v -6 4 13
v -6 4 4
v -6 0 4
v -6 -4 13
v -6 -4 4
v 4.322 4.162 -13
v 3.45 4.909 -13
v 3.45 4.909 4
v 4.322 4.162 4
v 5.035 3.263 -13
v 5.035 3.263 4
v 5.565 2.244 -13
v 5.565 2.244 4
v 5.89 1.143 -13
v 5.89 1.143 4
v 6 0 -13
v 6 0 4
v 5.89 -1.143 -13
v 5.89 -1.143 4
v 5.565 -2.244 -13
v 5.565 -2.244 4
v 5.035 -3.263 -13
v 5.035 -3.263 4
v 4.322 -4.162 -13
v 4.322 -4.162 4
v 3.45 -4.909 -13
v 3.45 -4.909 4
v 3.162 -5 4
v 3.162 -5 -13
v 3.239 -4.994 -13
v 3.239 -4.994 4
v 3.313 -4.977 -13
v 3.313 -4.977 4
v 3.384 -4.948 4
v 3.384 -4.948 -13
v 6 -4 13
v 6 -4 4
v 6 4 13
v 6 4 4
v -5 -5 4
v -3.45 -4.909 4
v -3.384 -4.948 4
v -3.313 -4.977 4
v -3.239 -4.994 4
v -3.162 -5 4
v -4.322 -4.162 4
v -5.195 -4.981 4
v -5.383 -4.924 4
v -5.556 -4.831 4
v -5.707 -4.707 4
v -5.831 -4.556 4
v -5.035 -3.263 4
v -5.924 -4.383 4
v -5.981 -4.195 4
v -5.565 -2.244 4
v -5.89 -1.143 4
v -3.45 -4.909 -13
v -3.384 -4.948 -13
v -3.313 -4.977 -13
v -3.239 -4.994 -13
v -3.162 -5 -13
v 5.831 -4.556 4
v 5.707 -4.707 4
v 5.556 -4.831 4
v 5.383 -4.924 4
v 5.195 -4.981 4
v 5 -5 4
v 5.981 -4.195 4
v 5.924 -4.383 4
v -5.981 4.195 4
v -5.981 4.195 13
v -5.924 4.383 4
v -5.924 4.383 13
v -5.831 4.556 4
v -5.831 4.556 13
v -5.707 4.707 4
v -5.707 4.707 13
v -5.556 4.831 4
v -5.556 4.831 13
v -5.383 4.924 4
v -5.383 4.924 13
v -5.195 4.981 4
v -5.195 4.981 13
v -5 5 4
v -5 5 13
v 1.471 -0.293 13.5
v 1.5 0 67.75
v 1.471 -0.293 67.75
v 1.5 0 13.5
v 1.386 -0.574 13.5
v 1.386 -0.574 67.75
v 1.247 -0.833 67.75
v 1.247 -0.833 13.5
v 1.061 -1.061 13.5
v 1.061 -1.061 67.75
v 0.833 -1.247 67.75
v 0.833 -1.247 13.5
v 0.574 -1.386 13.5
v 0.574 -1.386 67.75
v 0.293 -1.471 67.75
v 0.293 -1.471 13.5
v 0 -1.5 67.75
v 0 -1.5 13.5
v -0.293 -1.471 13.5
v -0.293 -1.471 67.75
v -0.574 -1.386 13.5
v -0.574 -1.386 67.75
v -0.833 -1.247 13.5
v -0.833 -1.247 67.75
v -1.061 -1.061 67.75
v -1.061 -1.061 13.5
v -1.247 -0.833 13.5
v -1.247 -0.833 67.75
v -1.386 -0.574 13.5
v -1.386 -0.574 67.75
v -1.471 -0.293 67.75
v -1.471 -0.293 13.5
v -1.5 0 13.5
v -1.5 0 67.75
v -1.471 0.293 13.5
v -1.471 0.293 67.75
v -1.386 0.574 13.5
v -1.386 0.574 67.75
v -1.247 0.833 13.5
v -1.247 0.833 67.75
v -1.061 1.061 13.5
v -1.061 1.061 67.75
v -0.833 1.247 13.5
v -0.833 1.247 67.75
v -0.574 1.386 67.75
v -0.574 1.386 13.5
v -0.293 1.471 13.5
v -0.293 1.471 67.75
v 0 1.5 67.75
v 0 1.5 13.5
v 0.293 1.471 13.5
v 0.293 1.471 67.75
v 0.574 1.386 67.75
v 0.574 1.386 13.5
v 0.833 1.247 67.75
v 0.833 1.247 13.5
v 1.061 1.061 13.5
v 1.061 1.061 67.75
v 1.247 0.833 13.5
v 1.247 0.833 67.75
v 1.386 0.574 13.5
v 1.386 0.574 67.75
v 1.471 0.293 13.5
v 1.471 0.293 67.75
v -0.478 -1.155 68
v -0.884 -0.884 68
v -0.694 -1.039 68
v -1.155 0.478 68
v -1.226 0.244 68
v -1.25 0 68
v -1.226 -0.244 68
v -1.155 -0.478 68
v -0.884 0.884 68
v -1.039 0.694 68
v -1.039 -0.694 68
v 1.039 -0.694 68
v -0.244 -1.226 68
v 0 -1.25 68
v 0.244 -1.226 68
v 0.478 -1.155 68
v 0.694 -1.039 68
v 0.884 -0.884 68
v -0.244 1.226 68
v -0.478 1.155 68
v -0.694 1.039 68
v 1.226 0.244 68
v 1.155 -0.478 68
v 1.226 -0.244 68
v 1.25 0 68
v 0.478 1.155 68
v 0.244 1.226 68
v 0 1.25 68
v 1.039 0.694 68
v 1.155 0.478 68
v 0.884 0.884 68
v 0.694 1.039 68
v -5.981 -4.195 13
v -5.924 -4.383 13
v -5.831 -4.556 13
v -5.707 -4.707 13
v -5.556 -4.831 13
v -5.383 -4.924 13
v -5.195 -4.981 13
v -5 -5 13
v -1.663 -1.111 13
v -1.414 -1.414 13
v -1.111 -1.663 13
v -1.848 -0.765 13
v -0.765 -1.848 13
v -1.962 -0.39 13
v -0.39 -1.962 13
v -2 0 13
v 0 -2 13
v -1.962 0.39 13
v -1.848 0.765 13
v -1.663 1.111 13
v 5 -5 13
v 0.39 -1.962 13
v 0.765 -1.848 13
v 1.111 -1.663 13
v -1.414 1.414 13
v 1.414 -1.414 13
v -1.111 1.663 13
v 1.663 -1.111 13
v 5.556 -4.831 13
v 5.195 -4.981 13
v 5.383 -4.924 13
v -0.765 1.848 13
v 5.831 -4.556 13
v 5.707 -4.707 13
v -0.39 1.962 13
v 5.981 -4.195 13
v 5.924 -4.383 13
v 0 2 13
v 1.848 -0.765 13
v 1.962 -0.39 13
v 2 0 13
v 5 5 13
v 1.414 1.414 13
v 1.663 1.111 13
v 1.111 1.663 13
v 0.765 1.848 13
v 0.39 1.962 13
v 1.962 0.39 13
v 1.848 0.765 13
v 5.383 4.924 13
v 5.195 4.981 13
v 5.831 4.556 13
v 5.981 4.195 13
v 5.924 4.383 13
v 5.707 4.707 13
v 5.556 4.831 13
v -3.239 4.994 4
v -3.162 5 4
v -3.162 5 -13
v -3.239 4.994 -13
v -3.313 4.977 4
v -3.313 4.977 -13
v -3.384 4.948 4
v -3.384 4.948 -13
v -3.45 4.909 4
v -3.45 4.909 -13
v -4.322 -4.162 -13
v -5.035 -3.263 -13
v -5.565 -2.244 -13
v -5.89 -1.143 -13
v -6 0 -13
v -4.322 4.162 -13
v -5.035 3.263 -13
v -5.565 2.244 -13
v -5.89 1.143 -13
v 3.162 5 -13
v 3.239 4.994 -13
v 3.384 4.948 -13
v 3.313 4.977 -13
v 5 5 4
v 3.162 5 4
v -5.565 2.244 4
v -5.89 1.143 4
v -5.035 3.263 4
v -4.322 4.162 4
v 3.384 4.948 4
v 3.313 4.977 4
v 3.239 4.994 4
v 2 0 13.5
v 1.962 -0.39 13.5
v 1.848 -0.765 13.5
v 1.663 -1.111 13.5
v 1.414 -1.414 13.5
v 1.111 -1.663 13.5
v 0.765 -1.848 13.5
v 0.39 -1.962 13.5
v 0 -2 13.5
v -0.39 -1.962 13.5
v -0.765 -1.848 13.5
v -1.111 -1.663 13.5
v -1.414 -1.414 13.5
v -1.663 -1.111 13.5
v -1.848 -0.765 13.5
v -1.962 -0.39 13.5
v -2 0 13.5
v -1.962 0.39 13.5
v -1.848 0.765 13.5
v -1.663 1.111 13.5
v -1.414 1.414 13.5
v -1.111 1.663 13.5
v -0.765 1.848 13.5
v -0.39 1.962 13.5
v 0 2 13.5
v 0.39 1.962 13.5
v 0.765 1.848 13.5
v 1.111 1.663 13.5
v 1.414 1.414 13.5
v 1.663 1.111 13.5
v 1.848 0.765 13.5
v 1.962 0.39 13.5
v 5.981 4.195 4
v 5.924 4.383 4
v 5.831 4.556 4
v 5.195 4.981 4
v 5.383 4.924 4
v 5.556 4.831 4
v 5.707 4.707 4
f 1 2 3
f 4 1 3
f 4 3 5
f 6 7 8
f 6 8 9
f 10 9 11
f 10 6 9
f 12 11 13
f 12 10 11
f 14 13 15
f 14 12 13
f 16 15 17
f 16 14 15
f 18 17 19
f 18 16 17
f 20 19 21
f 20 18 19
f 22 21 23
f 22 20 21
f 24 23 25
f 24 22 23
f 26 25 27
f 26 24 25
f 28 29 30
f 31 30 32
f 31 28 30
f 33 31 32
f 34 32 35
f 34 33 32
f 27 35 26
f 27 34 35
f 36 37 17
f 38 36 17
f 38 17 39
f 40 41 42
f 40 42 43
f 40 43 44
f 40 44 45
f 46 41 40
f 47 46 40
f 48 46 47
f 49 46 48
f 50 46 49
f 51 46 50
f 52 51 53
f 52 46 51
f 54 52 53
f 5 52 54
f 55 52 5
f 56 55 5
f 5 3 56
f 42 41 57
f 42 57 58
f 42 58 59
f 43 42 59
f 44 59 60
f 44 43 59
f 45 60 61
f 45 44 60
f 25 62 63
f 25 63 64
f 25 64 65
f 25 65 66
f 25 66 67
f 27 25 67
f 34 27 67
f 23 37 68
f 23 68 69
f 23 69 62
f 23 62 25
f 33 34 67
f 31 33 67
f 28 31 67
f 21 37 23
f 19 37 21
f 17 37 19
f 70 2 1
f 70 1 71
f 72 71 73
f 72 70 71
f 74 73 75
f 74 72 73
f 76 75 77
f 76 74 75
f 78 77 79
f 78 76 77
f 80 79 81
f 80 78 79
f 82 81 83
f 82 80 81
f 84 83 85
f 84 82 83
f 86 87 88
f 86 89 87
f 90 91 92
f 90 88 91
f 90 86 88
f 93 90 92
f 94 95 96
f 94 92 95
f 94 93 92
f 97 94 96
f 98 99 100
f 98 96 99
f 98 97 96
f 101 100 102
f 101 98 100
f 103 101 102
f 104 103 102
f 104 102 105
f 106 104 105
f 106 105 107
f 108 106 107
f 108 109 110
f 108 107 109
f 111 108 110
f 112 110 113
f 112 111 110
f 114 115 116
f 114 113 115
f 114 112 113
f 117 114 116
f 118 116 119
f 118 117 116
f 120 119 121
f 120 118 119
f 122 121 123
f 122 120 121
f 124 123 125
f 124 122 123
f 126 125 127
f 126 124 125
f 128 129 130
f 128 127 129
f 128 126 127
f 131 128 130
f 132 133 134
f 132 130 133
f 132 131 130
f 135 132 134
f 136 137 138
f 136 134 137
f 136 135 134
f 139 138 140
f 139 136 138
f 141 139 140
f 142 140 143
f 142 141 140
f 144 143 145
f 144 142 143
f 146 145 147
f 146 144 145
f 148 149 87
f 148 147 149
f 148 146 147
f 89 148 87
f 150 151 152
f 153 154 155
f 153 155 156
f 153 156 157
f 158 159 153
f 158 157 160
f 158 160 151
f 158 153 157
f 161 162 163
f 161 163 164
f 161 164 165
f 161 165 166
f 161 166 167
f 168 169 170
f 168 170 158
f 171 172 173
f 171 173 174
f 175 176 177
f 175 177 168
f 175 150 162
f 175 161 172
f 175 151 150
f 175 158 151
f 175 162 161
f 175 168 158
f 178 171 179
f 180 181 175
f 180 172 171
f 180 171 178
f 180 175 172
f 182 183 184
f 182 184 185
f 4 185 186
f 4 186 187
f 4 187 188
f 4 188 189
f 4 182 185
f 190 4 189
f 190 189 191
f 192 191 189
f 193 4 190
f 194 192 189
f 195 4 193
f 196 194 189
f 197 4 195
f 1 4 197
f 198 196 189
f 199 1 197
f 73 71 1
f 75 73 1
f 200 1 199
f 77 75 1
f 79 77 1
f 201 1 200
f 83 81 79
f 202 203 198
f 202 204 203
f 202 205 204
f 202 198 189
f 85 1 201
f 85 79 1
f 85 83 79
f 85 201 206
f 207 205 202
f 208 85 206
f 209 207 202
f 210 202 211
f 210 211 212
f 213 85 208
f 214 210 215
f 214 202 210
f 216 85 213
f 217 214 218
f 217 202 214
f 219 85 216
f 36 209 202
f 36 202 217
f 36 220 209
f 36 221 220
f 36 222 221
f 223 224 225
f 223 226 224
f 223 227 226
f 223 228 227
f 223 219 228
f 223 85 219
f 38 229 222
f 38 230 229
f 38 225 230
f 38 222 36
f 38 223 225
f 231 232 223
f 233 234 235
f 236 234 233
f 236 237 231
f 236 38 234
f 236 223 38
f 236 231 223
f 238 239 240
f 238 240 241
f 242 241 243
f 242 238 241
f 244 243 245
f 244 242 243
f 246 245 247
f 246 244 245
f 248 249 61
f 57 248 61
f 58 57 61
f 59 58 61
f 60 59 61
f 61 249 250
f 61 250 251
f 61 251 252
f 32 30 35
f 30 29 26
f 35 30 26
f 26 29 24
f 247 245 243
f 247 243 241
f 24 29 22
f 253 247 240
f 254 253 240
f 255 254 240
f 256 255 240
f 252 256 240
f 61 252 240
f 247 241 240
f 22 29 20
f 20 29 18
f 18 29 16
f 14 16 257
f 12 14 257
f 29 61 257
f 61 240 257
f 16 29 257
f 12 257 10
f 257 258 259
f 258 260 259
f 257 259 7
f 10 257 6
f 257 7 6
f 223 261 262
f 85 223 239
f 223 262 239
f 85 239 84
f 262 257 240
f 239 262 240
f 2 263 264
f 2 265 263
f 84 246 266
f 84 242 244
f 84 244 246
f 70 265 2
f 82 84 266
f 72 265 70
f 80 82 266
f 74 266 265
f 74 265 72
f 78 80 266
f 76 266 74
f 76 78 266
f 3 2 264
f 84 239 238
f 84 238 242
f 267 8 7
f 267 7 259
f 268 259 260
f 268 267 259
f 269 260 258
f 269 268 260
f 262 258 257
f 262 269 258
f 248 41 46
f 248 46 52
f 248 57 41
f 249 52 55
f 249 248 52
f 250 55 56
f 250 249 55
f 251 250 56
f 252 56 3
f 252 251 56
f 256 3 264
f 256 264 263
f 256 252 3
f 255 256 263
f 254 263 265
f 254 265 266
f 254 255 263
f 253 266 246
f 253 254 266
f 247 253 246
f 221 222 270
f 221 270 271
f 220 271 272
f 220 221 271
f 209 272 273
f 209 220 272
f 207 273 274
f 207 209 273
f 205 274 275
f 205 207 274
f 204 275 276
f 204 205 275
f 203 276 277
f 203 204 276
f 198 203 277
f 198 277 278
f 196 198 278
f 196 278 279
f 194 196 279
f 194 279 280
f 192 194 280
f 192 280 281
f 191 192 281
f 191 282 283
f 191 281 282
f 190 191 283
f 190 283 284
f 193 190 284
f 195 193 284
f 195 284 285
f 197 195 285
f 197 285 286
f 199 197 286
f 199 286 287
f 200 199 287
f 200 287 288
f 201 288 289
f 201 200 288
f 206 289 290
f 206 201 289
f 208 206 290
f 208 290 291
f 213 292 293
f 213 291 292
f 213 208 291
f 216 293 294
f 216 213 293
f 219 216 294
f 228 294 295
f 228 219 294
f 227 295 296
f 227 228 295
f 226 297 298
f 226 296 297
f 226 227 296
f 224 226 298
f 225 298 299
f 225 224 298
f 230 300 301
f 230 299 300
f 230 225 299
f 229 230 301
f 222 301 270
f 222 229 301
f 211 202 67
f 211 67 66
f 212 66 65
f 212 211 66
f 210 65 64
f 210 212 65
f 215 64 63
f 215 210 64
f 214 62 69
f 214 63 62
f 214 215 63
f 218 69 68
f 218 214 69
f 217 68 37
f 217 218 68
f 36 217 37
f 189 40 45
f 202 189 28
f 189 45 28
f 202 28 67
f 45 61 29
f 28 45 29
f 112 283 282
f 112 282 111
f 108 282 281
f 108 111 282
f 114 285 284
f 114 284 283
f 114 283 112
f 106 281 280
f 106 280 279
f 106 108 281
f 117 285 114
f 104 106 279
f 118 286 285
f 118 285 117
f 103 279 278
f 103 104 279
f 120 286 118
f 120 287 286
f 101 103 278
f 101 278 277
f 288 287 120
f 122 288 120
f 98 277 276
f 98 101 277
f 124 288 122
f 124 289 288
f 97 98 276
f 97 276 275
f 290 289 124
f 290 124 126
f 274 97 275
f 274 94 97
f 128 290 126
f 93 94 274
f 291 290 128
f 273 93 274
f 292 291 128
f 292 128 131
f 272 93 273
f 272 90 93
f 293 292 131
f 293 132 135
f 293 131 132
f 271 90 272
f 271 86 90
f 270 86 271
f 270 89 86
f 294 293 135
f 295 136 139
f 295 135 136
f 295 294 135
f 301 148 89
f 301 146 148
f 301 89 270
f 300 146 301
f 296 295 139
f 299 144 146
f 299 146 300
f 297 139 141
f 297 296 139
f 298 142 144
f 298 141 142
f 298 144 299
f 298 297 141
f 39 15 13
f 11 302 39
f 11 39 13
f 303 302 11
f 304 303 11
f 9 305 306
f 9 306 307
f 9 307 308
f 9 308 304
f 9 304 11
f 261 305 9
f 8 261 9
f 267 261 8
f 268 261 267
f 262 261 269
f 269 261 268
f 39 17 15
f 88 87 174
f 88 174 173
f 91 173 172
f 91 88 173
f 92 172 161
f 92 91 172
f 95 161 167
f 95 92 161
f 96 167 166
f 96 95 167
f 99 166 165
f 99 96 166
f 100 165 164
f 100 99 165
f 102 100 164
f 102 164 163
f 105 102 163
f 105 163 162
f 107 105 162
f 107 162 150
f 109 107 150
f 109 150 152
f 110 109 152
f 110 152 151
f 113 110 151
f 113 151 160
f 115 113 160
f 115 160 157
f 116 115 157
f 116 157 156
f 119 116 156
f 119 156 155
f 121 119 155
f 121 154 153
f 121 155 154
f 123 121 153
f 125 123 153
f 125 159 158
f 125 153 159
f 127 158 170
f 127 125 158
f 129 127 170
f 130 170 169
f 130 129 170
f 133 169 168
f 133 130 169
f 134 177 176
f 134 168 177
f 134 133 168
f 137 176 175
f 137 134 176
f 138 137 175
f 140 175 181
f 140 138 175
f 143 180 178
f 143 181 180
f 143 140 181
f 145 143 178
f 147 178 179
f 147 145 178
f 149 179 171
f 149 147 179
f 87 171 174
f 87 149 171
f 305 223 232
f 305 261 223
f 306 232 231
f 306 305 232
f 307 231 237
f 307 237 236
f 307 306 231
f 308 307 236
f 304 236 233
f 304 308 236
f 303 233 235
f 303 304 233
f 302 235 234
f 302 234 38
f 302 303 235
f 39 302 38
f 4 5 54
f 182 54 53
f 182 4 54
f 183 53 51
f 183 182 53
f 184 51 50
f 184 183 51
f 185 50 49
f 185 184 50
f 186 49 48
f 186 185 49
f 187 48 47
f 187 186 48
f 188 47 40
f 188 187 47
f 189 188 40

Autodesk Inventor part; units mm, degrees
ref_plane "YZ Plane" through (0, 0, 0) normal (1, 0, 0) x (0, 1, 0)
ref_plane "XZ Plane" through (0, 0, 0) normal (0, 1, 0) x (-1, 0, 0)
ref_plane "XY Plane" through (0, 0, 0) normal (0, 0, 1) x (1, 0, 0)
sketch "Sketch1" plane through (0, 0, 0) normal (0, 0, 1) x (1, 0, 0)
  line L0 (-6, -5) -> (6, -5)
  line L1 (6, -5) -> (6, 5)
  line L2 (6, 5) -> (-6, 5)
  line L3 (-6, 5) -> (-6, -5)
  line L4 (-6, -5) -> (6, 5) construction
  line L5 (6, -5) -> (-6, 5) construction
  point P0 (0, 0)
  dimension "d0" = 12
  dimension "d1" = 10
extrude "Extrusion1" add sketch "Sketch1" along normal mid plane 26
sketch "Sketch2" plane through (0, 0, 13) normal (0, 0, 1) x (1, 0, 0)
  circle A0 centre (0, 0) radius 1.5
  circle A1 centre (0, 0) radius 2
  dimension "d4" = 3
  dimension "d12" = 4
extrude "Extrusion2" add sketch "Sketch2" along normal blind 55 contours A0
fillet "Fillet1" radius 1 4 edges at (6, 5, 0) (-6, 5, 0) (6, -5, 0) (-6, -5, 0)
sketch "Sketch3" plane through (0, 0, -13) normal (0, 0, -1) x (-1, 0, 0)
  arc A0 (5, -5) -> (6, -4) centre (5, -4) ccw projected
  line L0 (6, -4) -> (6, 4) projected
  arc A1 (6, 4) -> (5, 5) centre (5, 4) ccw projected
  line L1 (5, 5) -> (-5, 5) projected
  arc A2 (-5, 5) -> (-6, 4) centre (-5, 4) ccw projected
  line L2 (-6, 4) -> (-6, -4) projected
  arc A3 (-6, -4) -> (-5, -5) centre (-5, -4) ccw projected
  line L3 (-5, -5) -> (5, -5) projected
  circle A4 centre (0, 0) radius 6
  point P0 (3.3166, 5)
  point P1 (6, 0)
  point P2 (3.3166, -5)
  point P3 (-3.3166, -5)
  point P4 (-6, 0)
  point P5 (-3.3166, 5)
  dimension "d8" = 12
extrude "Extrusion3" cut sketch "Sketch3" against normal blind 17 contours L3 A4 L0 A0 | A4 L1 A1 L0 | L3 A3 L2 A4 | L2 A2 L1 A4
fillet "Fillet2" radius 0.5 4 edges at (-3.3166, -5, -4.5) (3.3166, -5, -4.5) (-3.3166, 5, -4.5) (3.3166, 5, -4.5)
extrude "Extrusion4" add sketch "Sketch2" along normal blind 0.5
chamfer "Chamfer1" distance 0.25 angle 45 1 edges at (-1.5, 0, 68)
properties part number "DC Motor"
